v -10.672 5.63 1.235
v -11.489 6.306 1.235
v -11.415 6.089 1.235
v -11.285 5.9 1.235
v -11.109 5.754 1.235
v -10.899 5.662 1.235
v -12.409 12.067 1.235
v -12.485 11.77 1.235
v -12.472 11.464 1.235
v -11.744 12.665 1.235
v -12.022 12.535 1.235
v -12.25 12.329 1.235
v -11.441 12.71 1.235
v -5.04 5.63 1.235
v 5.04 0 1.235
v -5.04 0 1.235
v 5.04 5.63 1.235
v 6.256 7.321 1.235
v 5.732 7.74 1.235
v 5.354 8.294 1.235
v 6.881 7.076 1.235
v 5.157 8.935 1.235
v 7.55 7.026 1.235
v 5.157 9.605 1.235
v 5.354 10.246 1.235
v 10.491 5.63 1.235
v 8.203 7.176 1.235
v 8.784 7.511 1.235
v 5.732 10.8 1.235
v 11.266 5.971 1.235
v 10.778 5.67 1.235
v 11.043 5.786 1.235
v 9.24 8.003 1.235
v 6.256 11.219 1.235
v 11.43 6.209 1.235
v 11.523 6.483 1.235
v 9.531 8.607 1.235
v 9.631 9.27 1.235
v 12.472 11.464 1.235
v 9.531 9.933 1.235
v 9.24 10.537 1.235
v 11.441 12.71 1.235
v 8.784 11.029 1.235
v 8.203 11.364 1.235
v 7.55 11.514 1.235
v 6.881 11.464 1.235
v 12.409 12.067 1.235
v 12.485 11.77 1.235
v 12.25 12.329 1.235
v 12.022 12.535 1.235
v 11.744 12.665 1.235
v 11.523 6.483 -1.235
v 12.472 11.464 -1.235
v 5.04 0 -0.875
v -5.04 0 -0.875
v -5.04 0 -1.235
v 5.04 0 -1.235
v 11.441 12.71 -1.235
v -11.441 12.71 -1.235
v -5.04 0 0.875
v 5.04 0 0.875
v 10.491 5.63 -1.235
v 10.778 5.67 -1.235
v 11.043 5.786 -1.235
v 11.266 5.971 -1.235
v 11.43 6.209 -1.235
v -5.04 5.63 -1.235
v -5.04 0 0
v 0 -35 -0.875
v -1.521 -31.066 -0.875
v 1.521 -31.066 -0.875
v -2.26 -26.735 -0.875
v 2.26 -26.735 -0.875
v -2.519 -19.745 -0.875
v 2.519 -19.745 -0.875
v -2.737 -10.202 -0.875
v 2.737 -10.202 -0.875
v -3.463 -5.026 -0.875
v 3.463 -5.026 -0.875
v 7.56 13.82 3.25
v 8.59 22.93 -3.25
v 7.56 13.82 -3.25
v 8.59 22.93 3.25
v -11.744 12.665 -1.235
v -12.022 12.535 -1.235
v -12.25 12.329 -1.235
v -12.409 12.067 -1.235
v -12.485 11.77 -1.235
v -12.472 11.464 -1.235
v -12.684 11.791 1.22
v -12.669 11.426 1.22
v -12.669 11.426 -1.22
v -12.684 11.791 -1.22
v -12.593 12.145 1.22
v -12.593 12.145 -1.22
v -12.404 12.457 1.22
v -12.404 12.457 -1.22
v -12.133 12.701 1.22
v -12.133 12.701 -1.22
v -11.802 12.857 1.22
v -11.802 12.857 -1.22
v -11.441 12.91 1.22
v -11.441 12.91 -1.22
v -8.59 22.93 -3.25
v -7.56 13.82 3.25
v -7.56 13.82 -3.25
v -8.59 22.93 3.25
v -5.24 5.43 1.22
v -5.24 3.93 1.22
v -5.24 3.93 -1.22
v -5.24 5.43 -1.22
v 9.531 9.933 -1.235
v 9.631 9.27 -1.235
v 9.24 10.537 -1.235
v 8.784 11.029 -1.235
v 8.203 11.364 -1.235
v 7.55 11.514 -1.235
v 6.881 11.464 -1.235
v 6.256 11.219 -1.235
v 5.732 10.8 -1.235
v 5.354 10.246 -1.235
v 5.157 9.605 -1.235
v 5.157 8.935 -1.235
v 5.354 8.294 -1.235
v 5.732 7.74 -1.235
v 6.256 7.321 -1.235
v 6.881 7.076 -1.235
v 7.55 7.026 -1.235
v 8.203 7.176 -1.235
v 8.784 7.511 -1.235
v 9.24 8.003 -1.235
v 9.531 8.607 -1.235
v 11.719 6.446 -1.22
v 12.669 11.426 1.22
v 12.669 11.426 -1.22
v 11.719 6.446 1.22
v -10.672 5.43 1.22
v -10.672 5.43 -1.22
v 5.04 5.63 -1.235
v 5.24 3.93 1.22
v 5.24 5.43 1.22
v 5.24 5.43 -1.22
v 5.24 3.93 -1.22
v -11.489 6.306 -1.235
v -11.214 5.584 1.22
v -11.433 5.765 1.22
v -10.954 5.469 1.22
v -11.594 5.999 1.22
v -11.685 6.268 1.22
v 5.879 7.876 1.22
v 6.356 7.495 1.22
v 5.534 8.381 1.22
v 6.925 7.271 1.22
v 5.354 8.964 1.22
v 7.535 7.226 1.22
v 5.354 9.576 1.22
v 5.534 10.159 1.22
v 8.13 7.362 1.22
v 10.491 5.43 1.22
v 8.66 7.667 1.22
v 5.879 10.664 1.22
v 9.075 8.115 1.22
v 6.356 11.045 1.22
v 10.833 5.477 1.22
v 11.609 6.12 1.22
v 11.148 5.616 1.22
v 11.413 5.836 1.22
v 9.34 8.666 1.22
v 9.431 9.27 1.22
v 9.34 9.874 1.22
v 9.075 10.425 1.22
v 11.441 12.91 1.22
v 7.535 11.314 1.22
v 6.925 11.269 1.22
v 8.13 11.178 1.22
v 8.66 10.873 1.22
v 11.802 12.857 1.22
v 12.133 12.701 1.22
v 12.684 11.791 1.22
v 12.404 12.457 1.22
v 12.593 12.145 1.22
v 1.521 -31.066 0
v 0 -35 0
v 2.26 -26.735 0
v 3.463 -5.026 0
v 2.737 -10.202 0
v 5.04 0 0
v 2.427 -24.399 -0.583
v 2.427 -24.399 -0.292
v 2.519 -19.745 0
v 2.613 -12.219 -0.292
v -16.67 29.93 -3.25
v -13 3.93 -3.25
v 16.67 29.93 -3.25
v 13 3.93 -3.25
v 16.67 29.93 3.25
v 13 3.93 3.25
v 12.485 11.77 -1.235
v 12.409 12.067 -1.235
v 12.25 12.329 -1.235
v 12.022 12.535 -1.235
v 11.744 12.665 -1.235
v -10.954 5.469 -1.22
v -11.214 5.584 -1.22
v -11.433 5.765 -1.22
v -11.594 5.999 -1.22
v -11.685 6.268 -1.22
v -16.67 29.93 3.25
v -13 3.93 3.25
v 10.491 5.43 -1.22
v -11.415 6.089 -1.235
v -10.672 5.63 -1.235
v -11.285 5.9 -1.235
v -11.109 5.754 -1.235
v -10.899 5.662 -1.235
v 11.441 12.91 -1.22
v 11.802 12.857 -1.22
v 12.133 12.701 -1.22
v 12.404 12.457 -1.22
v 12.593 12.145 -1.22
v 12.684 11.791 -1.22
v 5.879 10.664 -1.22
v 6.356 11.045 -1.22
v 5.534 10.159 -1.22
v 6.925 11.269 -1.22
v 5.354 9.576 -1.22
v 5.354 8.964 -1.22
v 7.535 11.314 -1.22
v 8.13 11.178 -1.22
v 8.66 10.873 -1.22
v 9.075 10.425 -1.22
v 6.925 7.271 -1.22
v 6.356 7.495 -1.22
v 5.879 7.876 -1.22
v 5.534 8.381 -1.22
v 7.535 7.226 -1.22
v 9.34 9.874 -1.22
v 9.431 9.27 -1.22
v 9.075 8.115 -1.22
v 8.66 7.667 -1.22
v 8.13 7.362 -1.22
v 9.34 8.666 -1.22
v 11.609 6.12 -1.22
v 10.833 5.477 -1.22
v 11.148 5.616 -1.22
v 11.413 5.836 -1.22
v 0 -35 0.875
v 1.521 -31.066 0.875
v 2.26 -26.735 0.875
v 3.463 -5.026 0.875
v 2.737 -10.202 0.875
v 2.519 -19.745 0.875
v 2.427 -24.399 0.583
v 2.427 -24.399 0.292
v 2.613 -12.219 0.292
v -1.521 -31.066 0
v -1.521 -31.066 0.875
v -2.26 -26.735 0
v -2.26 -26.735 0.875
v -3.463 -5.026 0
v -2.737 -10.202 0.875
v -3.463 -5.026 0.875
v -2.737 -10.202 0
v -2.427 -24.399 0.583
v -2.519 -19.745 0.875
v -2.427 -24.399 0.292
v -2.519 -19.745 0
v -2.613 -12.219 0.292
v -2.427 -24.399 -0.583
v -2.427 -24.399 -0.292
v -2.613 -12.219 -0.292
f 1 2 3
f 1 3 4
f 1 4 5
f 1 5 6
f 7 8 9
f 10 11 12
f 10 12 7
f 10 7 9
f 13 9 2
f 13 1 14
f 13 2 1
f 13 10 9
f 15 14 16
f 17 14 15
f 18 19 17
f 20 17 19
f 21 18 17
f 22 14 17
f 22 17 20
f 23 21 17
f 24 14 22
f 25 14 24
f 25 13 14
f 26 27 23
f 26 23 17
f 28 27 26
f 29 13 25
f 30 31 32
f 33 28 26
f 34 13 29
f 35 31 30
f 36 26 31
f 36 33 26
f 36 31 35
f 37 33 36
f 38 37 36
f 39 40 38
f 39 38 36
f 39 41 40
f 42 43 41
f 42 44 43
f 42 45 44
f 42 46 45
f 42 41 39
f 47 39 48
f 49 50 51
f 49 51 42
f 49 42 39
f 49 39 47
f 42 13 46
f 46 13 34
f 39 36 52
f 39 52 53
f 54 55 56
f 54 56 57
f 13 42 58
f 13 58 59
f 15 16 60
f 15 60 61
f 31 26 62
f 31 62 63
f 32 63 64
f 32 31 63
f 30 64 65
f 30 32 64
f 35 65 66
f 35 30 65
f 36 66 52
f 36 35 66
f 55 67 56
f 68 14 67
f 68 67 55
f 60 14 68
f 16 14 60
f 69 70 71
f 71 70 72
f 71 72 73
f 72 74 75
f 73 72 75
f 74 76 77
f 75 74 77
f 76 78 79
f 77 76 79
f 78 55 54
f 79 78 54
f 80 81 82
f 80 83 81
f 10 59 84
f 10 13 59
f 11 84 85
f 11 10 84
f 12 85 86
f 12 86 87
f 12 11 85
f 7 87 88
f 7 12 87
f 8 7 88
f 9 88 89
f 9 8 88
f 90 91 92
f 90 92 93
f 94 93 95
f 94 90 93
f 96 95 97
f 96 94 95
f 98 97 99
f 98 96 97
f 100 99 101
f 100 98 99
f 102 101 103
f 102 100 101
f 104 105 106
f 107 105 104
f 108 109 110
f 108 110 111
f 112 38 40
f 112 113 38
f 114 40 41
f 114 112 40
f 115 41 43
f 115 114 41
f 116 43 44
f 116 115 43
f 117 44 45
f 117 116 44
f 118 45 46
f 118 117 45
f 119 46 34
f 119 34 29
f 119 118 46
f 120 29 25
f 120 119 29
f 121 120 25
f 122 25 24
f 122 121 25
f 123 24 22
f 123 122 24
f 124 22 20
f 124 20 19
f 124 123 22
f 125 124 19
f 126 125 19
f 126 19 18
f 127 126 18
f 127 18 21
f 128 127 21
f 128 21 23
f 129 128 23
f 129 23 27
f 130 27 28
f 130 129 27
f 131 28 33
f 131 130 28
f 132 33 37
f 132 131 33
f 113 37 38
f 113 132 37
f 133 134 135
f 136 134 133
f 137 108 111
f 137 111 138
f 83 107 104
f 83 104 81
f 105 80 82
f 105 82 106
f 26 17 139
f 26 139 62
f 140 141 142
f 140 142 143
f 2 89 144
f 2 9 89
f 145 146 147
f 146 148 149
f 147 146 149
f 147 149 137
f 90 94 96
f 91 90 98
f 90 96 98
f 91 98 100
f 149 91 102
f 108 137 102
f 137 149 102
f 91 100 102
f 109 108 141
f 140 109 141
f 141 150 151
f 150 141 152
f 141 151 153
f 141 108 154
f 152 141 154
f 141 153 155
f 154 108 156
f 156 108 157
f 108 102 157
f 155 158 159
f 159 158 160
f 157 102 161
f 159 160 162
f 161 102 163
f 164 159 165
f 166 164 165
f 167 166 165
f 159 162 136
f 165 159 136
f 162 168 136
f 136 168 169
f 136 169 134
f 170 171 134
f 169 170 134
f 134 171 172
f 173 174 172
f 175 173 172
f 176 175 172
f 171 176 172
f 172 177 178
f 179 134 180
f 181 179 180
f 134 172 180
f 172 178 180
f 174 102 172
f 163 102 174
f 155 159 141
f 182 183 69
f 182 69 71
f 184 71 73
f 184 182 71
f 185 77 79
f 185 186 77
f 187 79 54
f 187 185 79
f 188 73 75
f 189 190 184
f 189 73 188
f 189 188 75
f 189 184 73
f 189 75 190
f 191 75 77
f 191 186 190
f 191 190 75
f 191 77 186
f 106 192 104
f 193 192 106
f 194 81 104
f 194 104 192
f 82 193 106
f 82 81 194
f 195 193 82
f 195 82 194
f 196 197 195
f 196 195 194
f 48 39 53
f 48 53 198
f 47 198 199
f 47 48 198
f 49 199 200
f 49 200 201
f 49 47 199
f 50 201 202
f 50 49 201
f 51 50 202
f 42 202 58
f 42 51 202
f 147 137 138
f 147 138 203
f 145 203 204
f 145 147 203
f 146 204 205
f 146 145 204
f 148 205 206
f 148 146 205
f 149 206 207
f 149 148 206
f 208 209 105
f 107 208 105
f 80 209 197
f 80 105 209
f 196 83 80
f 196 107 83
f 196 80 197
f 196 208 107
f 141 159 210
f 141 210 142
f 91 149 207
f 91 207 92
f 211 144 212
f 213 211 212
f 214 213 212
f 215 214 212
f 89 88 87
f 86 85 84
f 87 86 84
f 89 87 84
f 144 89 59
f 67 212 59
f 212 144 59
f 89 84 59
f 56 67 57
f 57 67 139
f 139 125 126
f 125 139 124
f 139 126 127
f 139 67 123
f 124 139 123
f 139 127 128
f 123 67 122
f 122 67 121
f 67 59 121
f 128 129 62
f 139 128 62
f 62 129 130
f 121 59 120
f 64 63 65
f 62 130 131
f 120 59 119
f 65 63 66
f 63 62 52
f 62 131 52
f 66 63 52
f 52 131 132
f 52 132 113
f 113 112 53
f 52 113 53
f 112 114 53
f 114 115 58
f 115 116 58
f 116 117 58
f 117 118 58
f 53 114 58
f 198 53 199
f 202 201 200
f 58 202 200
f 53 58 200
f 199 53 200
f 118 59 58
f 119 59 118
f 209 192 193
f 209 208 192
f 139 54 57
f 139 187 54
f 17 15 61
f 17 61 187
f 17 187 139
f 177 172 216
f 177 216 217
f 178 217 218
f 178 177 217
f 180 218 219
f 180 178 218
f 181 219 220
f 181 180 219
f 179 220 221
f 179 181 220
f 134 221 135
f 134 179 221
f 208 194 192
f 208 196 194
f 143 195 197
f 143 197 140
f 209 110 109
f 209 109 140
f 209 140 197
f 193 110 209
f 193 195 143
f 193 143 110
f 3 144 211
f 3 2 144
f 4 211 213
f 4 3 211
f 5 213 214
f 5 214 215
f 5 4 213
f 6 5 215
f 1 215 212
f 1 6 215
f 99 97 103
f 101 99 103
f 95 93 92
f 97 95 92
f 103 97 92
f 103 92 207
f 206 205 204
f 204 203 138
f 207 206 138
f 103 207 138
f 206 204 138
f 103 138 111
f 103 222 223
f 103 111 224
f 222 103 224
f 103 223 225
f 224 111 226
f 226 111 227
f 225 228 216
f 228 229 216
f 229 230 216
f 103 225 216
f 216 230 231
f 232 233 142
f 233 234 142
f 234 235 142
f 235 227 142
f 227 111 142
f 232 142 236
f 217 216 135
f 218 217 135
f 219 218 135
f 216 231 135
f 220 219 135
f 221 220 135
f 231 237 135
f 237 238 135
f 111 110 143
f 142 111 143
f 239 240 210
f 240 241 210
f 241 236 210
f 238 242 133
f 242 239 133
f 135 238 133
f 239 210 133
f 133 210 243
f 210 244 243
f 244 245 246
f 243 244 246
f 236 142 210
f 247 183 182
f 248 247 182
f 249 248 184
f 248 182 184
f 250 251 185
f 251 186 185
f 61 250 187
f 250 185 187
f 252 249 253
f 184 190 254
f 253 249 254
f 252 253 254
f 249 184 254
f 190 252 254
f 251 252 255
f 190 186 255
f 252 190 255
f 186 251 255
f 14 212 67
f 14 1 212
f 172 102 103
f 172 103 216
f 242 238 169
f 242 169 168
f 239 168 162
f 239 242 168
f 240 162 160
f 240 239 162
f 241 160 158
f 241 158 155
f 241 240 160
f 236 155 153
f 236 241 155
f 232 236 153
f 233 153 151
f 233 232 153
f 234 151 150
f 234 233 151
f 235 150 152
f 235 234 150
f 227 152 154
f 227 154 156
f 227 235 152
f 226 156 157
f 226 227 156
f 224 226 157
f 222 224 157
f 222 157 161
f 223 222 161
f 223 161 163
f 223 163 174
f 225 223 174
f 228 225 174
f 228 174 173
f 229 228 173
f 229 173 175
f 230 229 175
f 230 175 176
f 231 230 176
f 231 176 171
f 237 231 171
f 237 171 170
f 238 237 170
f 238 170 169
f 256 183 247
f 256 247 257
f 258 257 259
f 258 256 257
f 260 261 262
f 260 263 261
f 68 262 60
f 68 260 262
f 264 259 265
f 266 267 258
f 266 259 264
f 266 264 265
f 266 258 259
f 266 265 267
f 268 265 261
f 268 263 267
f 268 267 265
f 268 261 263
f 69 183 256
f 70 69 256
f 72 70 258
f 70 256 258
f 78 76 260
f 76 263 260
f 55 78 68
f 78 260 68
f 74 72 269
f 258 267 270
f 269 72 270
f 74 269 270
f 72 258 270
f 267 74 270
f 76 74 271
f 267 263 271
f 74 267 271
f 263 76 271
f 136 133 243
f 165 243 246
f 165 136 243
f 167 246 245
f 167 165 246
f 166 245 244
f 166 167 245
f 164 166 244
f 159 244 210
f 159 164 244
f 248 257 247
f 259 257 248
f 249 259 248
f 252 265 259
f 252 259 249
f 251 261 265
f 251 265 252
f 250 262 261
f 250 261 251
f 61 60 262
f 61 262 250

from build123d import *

# Parameters (mm, degrees)
F0_R      = 2.25
F1_DEPTH  = 1.235
F2_DEPTH  = 0.875
F5_DEPTH  = 3.25
F7_DEPTH  = 2.03
F8_R      = 2.0499999718
F9_DEPTH  = 2.03
F10_DEPTH = 4.5


with BuildPart() as f1:
    # F0 (on Top) → F1 (new body, symmetric)
    with BuildSketch(Plane.XY):
        with BuildLine():
            Line((-5.04, 0), (0, 0))
            Line((0, 0), (5.04, 0))
            Line((5.04, 0), (5.04, 5.63))
            Line((5.04, 5.63), (10.4914237453, 5.63))
            ThreePointArc((10.4914237453, 5.63), (11.1606512853, 5.8709517365), (11.5226872593, 6.4832042932))
            Line((11.5226872593, 6.4832042932), (12.4723232041, 11.4635172481))
            ThreePointArc((12.4723232041, 11.4635172481), (12.2499514761, 12.3293840175), (11.4410596901, 12.71))
            Line((11.4410596901, 12.71), (0, 12.71))
            Line((0, 12.71), (-11.4410596901, 12.71))
            ThreePointArc((-11.4410596901, 12.71), (-12.2499514761, 12.3293840175), (-12.4723232041, 11.4635172481))
            Line((-12.4723232041, 11.4635172481), (-11.4888786252, 6.3058967898))
            ThreePointArc((-11.4888786252, 6.3058967898), (-11.2020786705, 5.8208786753), (-10.6719257522, 5.63))
            Line((-10.6719257522, 5.63), (-5.04, 5.63))
            Line((-5.04, 5.63), (-5.04, 0))
        make_face()
        with Locations((7.3813709514, 9.27)):
            Circle(F0_R, mode=Mode.SUBTRACT)
    extrude(amount=F1_DEPTH, both=True)

    # F0 (on Top) → F2 (join, symmetric)
    with BuildSketch(Plane.XY):
        with BuildLine():
            Line((5.04, 0), (0, 0))
            Line((0, 0), (0, -35))
            add(Edge.make_bspline(
                [(0, -35), (5.04, -25.7009714842), (0, -11.7251211777), (5.04, 0)],
                knots=[0, 0, 0, 0, 35.3610180849, 35.3610180849, 35.3610180849, 35.3610180849], degree=3))
        make_face()
        with BuildLine():
            Line((0, -35), (0, 0))
            Line((0, 0), (-5.04, 0))
            add(Edge.make_bspline(
                [(0, -35), (-5.04, -25.7009714842), (0, -11.7251211777), (-5.04, 0)],
                knots=[0, 0, 0, 0, 35.3610180849, 35.3610180849, 35.3610180849, 35.3610180849], degree=3))
        make_face()
    extrude(amount=F2_DEPTH, both=True)


with BuildPart() as f5:
    # F4 (on Top) → F5 (new body, symmetric)
    with BuildSketch(Plane.XY):
        with BuildLine():
            Line((-13, 3.9300001469), (-5.2399998531, 3.9300001469))
            Line((-5.2399998531, 3.9300001469), (-5.2399998531, 5.4300001469))
            Line((-5.2399998531, 5.4300001469), (-10.6719257522, 5.4300001469))
            ThreePointArc((-10.6719257522, 5.4300001469), (-11.3295694887, 5.666781198), (-11.6853389041, 6.2684361434))
            Line((-11.6853389041, 6.2684361434), (-12.668783483, 11.4260566017))
            ThreePointArc((-12.668783483, 11.4260566017), (-12.4040489534, 12.4568748357), (-11.4410596901, 12.9099998531))
            Line((-11.4410596901, 12.9099998531), (11.4410596901, 12.9099998531))
            ThreePointArc((11.4410596901, 12.9099998531), (12.4040489534, 12.4568748357), (12.668783483, 11.4260566017))
            Line((12.668783483, 11.4260566017), (11.7191475382, 6.4457436467))
            ThreePointArc((11.7191475382, 6.4457436467), (11.2881421035, 5.7168542592), (10.4914237453, 5.4300001469))
            Line((10.4914237453, 5.4300001469), (5.2399998531, 5.4300001469))
            Line((5.2399998531, 5.4300001469), (5.2399998531, 3.9300001469))
            Line((5.2399998531, 3.9300001469), (13, 3.9300001469))
            Line((13, 3.9300001469), (16.67, 29.9300001469))
            Line((16.67, 29.9300001469), (0, 29.9300001469))
            Line((0, 29.9300001469), (-16.67, 29.9300001469))
            Line((-16.67, 29.9300001469), (-13, 3.9300001469))
        make_face()
        Polygon((7.56, 13.8200001469), (0, 13.8200001469), (-7.56, 13.8200001469), (-8.59, 22.9300001469), (0, 22.9300001469), (8.59, 22.9300001469), align=None, mode=Mode.SUBTRACT)
    extrude(amount=F5_DEPTH, both=True)

    # F6 (on face) → F7 (join)
    with BuildSketch(Plane.XY.offset(3.25)):
        with BuildLine():
            Line((11.4410596901, 12.9099998531), (-11.4410596901, 12.9099998531))
            ThreePointArc((-11.4410596901, 12.9099998531), (-12.4040489534, 12.4568748357), (-12.668783483, 11.4260566017))
            Line((-12.668783483, 11.4260566017), (-11.6853389041, 6.2684361434))
            ThreePointArc((-11.6853389041, 6.2684361434), (-11.3295694887, 5.666781198), (-10.6719257522, 5.4300001469))
            Line((-10.6719257522, 5.4300001469), (-5.2399998531, 5.4300001469))
            Line((-5.2399998531, 5.4300001469), (-5.2399998531, 3.9300001469))
            Line((-5.2399998531, 3.9300001469), (5.2399998531, 3.9300001469))
            Line((5.2399998531, 3.9300001469), (5.2399998531, 5.4300001469))
            Line((5.2399998531, 5.4300001469), (10.4914237453, 5.4300001469))
            ThreePointArc((10.4914237453, 5.4300001469), (11.2881421035, 5.7168542592), (11.7191475382, 6.4457436467))
            Line((11.7191475382, 6.4457436467), (12.668783483, 11.4260566017))
            ThreePointArc((12.668783483, 11.4260566017), (12.4040489534, 12.4568748357), (11.4410596901, 12.9099998531))
        make_face()
    extrude(amount=-F7_DEPTH)

    # F8 (on face) → F9 (join)
    with BuildSketch(Plane(origin=(0, 0, -3.25), x_dir=(1, 0, 0), z_dir=(0, 0, -1))):
        with BuildLine():
            ThreePointArc((-12.668783483, -11.4260566017), (-12.4040489534, -12.4568748357), (-11.4410596901, -12.9099998531))
            Line((-11.4410596901, -12.9099998531), (11.4410596901, -12.9099998531))
            ThreePointArc((11.4410596901, -12.9099998531), (12.4040489534, -12.4568748357), (12.668783483, -11.4260566017))
            Line((12.668783483, -11.4260566017), (11.7191475382, -6.4457436467))
            ThreePointArc((11.7191475382, -6.4457436467), (11.2881421035, -5.7168542592), (10.4914237453, -5.4300001469))
            Line((10.4914237453, -5.4300001469), (5.2399998531, -5.4300001469))
            Line((5.2399998531, -5.4300001469), (5.2399998531, -3.9300001469))
            Line((5.2399998531, -3.9300001469), (-5.2399998531, -3.9300001469))
            Line((-5.2399998531, -3.9300001469), (-5.2399998531, -5.4300001469))
            Line((-5.2399998531, -5.4300001469), (-10.6719257522, -5.4300001469))
            ThreePointArc((-10.6719257522, -5.4300001469), (-11.3295694887, -5.666781198), (-11.6853389041, -6.2684361434))
            Line((-11.6853389041, -6.2684361434), (-12.668783483, -11.4260566017))
        make_face()
        with Locations((7.3813709514, -9.27)):
            Circle(F8_R, mode=Mode.SUBTRACT)
    extrude(amount=-F9_DEPTH)

    # F8 (on face) → F10 (join)
    with BuildSketch(Plane(origin=(0, 0, -3.25), x_dir=(1, 0, 0), z_dir=(0, 0, -1))):
        with Locations((7.3813709514, -9.27)):
            Circle(F8_R)
    extrude(amount=-F10_DEPTH)


solid = Compound([f1.part, f5.part])
